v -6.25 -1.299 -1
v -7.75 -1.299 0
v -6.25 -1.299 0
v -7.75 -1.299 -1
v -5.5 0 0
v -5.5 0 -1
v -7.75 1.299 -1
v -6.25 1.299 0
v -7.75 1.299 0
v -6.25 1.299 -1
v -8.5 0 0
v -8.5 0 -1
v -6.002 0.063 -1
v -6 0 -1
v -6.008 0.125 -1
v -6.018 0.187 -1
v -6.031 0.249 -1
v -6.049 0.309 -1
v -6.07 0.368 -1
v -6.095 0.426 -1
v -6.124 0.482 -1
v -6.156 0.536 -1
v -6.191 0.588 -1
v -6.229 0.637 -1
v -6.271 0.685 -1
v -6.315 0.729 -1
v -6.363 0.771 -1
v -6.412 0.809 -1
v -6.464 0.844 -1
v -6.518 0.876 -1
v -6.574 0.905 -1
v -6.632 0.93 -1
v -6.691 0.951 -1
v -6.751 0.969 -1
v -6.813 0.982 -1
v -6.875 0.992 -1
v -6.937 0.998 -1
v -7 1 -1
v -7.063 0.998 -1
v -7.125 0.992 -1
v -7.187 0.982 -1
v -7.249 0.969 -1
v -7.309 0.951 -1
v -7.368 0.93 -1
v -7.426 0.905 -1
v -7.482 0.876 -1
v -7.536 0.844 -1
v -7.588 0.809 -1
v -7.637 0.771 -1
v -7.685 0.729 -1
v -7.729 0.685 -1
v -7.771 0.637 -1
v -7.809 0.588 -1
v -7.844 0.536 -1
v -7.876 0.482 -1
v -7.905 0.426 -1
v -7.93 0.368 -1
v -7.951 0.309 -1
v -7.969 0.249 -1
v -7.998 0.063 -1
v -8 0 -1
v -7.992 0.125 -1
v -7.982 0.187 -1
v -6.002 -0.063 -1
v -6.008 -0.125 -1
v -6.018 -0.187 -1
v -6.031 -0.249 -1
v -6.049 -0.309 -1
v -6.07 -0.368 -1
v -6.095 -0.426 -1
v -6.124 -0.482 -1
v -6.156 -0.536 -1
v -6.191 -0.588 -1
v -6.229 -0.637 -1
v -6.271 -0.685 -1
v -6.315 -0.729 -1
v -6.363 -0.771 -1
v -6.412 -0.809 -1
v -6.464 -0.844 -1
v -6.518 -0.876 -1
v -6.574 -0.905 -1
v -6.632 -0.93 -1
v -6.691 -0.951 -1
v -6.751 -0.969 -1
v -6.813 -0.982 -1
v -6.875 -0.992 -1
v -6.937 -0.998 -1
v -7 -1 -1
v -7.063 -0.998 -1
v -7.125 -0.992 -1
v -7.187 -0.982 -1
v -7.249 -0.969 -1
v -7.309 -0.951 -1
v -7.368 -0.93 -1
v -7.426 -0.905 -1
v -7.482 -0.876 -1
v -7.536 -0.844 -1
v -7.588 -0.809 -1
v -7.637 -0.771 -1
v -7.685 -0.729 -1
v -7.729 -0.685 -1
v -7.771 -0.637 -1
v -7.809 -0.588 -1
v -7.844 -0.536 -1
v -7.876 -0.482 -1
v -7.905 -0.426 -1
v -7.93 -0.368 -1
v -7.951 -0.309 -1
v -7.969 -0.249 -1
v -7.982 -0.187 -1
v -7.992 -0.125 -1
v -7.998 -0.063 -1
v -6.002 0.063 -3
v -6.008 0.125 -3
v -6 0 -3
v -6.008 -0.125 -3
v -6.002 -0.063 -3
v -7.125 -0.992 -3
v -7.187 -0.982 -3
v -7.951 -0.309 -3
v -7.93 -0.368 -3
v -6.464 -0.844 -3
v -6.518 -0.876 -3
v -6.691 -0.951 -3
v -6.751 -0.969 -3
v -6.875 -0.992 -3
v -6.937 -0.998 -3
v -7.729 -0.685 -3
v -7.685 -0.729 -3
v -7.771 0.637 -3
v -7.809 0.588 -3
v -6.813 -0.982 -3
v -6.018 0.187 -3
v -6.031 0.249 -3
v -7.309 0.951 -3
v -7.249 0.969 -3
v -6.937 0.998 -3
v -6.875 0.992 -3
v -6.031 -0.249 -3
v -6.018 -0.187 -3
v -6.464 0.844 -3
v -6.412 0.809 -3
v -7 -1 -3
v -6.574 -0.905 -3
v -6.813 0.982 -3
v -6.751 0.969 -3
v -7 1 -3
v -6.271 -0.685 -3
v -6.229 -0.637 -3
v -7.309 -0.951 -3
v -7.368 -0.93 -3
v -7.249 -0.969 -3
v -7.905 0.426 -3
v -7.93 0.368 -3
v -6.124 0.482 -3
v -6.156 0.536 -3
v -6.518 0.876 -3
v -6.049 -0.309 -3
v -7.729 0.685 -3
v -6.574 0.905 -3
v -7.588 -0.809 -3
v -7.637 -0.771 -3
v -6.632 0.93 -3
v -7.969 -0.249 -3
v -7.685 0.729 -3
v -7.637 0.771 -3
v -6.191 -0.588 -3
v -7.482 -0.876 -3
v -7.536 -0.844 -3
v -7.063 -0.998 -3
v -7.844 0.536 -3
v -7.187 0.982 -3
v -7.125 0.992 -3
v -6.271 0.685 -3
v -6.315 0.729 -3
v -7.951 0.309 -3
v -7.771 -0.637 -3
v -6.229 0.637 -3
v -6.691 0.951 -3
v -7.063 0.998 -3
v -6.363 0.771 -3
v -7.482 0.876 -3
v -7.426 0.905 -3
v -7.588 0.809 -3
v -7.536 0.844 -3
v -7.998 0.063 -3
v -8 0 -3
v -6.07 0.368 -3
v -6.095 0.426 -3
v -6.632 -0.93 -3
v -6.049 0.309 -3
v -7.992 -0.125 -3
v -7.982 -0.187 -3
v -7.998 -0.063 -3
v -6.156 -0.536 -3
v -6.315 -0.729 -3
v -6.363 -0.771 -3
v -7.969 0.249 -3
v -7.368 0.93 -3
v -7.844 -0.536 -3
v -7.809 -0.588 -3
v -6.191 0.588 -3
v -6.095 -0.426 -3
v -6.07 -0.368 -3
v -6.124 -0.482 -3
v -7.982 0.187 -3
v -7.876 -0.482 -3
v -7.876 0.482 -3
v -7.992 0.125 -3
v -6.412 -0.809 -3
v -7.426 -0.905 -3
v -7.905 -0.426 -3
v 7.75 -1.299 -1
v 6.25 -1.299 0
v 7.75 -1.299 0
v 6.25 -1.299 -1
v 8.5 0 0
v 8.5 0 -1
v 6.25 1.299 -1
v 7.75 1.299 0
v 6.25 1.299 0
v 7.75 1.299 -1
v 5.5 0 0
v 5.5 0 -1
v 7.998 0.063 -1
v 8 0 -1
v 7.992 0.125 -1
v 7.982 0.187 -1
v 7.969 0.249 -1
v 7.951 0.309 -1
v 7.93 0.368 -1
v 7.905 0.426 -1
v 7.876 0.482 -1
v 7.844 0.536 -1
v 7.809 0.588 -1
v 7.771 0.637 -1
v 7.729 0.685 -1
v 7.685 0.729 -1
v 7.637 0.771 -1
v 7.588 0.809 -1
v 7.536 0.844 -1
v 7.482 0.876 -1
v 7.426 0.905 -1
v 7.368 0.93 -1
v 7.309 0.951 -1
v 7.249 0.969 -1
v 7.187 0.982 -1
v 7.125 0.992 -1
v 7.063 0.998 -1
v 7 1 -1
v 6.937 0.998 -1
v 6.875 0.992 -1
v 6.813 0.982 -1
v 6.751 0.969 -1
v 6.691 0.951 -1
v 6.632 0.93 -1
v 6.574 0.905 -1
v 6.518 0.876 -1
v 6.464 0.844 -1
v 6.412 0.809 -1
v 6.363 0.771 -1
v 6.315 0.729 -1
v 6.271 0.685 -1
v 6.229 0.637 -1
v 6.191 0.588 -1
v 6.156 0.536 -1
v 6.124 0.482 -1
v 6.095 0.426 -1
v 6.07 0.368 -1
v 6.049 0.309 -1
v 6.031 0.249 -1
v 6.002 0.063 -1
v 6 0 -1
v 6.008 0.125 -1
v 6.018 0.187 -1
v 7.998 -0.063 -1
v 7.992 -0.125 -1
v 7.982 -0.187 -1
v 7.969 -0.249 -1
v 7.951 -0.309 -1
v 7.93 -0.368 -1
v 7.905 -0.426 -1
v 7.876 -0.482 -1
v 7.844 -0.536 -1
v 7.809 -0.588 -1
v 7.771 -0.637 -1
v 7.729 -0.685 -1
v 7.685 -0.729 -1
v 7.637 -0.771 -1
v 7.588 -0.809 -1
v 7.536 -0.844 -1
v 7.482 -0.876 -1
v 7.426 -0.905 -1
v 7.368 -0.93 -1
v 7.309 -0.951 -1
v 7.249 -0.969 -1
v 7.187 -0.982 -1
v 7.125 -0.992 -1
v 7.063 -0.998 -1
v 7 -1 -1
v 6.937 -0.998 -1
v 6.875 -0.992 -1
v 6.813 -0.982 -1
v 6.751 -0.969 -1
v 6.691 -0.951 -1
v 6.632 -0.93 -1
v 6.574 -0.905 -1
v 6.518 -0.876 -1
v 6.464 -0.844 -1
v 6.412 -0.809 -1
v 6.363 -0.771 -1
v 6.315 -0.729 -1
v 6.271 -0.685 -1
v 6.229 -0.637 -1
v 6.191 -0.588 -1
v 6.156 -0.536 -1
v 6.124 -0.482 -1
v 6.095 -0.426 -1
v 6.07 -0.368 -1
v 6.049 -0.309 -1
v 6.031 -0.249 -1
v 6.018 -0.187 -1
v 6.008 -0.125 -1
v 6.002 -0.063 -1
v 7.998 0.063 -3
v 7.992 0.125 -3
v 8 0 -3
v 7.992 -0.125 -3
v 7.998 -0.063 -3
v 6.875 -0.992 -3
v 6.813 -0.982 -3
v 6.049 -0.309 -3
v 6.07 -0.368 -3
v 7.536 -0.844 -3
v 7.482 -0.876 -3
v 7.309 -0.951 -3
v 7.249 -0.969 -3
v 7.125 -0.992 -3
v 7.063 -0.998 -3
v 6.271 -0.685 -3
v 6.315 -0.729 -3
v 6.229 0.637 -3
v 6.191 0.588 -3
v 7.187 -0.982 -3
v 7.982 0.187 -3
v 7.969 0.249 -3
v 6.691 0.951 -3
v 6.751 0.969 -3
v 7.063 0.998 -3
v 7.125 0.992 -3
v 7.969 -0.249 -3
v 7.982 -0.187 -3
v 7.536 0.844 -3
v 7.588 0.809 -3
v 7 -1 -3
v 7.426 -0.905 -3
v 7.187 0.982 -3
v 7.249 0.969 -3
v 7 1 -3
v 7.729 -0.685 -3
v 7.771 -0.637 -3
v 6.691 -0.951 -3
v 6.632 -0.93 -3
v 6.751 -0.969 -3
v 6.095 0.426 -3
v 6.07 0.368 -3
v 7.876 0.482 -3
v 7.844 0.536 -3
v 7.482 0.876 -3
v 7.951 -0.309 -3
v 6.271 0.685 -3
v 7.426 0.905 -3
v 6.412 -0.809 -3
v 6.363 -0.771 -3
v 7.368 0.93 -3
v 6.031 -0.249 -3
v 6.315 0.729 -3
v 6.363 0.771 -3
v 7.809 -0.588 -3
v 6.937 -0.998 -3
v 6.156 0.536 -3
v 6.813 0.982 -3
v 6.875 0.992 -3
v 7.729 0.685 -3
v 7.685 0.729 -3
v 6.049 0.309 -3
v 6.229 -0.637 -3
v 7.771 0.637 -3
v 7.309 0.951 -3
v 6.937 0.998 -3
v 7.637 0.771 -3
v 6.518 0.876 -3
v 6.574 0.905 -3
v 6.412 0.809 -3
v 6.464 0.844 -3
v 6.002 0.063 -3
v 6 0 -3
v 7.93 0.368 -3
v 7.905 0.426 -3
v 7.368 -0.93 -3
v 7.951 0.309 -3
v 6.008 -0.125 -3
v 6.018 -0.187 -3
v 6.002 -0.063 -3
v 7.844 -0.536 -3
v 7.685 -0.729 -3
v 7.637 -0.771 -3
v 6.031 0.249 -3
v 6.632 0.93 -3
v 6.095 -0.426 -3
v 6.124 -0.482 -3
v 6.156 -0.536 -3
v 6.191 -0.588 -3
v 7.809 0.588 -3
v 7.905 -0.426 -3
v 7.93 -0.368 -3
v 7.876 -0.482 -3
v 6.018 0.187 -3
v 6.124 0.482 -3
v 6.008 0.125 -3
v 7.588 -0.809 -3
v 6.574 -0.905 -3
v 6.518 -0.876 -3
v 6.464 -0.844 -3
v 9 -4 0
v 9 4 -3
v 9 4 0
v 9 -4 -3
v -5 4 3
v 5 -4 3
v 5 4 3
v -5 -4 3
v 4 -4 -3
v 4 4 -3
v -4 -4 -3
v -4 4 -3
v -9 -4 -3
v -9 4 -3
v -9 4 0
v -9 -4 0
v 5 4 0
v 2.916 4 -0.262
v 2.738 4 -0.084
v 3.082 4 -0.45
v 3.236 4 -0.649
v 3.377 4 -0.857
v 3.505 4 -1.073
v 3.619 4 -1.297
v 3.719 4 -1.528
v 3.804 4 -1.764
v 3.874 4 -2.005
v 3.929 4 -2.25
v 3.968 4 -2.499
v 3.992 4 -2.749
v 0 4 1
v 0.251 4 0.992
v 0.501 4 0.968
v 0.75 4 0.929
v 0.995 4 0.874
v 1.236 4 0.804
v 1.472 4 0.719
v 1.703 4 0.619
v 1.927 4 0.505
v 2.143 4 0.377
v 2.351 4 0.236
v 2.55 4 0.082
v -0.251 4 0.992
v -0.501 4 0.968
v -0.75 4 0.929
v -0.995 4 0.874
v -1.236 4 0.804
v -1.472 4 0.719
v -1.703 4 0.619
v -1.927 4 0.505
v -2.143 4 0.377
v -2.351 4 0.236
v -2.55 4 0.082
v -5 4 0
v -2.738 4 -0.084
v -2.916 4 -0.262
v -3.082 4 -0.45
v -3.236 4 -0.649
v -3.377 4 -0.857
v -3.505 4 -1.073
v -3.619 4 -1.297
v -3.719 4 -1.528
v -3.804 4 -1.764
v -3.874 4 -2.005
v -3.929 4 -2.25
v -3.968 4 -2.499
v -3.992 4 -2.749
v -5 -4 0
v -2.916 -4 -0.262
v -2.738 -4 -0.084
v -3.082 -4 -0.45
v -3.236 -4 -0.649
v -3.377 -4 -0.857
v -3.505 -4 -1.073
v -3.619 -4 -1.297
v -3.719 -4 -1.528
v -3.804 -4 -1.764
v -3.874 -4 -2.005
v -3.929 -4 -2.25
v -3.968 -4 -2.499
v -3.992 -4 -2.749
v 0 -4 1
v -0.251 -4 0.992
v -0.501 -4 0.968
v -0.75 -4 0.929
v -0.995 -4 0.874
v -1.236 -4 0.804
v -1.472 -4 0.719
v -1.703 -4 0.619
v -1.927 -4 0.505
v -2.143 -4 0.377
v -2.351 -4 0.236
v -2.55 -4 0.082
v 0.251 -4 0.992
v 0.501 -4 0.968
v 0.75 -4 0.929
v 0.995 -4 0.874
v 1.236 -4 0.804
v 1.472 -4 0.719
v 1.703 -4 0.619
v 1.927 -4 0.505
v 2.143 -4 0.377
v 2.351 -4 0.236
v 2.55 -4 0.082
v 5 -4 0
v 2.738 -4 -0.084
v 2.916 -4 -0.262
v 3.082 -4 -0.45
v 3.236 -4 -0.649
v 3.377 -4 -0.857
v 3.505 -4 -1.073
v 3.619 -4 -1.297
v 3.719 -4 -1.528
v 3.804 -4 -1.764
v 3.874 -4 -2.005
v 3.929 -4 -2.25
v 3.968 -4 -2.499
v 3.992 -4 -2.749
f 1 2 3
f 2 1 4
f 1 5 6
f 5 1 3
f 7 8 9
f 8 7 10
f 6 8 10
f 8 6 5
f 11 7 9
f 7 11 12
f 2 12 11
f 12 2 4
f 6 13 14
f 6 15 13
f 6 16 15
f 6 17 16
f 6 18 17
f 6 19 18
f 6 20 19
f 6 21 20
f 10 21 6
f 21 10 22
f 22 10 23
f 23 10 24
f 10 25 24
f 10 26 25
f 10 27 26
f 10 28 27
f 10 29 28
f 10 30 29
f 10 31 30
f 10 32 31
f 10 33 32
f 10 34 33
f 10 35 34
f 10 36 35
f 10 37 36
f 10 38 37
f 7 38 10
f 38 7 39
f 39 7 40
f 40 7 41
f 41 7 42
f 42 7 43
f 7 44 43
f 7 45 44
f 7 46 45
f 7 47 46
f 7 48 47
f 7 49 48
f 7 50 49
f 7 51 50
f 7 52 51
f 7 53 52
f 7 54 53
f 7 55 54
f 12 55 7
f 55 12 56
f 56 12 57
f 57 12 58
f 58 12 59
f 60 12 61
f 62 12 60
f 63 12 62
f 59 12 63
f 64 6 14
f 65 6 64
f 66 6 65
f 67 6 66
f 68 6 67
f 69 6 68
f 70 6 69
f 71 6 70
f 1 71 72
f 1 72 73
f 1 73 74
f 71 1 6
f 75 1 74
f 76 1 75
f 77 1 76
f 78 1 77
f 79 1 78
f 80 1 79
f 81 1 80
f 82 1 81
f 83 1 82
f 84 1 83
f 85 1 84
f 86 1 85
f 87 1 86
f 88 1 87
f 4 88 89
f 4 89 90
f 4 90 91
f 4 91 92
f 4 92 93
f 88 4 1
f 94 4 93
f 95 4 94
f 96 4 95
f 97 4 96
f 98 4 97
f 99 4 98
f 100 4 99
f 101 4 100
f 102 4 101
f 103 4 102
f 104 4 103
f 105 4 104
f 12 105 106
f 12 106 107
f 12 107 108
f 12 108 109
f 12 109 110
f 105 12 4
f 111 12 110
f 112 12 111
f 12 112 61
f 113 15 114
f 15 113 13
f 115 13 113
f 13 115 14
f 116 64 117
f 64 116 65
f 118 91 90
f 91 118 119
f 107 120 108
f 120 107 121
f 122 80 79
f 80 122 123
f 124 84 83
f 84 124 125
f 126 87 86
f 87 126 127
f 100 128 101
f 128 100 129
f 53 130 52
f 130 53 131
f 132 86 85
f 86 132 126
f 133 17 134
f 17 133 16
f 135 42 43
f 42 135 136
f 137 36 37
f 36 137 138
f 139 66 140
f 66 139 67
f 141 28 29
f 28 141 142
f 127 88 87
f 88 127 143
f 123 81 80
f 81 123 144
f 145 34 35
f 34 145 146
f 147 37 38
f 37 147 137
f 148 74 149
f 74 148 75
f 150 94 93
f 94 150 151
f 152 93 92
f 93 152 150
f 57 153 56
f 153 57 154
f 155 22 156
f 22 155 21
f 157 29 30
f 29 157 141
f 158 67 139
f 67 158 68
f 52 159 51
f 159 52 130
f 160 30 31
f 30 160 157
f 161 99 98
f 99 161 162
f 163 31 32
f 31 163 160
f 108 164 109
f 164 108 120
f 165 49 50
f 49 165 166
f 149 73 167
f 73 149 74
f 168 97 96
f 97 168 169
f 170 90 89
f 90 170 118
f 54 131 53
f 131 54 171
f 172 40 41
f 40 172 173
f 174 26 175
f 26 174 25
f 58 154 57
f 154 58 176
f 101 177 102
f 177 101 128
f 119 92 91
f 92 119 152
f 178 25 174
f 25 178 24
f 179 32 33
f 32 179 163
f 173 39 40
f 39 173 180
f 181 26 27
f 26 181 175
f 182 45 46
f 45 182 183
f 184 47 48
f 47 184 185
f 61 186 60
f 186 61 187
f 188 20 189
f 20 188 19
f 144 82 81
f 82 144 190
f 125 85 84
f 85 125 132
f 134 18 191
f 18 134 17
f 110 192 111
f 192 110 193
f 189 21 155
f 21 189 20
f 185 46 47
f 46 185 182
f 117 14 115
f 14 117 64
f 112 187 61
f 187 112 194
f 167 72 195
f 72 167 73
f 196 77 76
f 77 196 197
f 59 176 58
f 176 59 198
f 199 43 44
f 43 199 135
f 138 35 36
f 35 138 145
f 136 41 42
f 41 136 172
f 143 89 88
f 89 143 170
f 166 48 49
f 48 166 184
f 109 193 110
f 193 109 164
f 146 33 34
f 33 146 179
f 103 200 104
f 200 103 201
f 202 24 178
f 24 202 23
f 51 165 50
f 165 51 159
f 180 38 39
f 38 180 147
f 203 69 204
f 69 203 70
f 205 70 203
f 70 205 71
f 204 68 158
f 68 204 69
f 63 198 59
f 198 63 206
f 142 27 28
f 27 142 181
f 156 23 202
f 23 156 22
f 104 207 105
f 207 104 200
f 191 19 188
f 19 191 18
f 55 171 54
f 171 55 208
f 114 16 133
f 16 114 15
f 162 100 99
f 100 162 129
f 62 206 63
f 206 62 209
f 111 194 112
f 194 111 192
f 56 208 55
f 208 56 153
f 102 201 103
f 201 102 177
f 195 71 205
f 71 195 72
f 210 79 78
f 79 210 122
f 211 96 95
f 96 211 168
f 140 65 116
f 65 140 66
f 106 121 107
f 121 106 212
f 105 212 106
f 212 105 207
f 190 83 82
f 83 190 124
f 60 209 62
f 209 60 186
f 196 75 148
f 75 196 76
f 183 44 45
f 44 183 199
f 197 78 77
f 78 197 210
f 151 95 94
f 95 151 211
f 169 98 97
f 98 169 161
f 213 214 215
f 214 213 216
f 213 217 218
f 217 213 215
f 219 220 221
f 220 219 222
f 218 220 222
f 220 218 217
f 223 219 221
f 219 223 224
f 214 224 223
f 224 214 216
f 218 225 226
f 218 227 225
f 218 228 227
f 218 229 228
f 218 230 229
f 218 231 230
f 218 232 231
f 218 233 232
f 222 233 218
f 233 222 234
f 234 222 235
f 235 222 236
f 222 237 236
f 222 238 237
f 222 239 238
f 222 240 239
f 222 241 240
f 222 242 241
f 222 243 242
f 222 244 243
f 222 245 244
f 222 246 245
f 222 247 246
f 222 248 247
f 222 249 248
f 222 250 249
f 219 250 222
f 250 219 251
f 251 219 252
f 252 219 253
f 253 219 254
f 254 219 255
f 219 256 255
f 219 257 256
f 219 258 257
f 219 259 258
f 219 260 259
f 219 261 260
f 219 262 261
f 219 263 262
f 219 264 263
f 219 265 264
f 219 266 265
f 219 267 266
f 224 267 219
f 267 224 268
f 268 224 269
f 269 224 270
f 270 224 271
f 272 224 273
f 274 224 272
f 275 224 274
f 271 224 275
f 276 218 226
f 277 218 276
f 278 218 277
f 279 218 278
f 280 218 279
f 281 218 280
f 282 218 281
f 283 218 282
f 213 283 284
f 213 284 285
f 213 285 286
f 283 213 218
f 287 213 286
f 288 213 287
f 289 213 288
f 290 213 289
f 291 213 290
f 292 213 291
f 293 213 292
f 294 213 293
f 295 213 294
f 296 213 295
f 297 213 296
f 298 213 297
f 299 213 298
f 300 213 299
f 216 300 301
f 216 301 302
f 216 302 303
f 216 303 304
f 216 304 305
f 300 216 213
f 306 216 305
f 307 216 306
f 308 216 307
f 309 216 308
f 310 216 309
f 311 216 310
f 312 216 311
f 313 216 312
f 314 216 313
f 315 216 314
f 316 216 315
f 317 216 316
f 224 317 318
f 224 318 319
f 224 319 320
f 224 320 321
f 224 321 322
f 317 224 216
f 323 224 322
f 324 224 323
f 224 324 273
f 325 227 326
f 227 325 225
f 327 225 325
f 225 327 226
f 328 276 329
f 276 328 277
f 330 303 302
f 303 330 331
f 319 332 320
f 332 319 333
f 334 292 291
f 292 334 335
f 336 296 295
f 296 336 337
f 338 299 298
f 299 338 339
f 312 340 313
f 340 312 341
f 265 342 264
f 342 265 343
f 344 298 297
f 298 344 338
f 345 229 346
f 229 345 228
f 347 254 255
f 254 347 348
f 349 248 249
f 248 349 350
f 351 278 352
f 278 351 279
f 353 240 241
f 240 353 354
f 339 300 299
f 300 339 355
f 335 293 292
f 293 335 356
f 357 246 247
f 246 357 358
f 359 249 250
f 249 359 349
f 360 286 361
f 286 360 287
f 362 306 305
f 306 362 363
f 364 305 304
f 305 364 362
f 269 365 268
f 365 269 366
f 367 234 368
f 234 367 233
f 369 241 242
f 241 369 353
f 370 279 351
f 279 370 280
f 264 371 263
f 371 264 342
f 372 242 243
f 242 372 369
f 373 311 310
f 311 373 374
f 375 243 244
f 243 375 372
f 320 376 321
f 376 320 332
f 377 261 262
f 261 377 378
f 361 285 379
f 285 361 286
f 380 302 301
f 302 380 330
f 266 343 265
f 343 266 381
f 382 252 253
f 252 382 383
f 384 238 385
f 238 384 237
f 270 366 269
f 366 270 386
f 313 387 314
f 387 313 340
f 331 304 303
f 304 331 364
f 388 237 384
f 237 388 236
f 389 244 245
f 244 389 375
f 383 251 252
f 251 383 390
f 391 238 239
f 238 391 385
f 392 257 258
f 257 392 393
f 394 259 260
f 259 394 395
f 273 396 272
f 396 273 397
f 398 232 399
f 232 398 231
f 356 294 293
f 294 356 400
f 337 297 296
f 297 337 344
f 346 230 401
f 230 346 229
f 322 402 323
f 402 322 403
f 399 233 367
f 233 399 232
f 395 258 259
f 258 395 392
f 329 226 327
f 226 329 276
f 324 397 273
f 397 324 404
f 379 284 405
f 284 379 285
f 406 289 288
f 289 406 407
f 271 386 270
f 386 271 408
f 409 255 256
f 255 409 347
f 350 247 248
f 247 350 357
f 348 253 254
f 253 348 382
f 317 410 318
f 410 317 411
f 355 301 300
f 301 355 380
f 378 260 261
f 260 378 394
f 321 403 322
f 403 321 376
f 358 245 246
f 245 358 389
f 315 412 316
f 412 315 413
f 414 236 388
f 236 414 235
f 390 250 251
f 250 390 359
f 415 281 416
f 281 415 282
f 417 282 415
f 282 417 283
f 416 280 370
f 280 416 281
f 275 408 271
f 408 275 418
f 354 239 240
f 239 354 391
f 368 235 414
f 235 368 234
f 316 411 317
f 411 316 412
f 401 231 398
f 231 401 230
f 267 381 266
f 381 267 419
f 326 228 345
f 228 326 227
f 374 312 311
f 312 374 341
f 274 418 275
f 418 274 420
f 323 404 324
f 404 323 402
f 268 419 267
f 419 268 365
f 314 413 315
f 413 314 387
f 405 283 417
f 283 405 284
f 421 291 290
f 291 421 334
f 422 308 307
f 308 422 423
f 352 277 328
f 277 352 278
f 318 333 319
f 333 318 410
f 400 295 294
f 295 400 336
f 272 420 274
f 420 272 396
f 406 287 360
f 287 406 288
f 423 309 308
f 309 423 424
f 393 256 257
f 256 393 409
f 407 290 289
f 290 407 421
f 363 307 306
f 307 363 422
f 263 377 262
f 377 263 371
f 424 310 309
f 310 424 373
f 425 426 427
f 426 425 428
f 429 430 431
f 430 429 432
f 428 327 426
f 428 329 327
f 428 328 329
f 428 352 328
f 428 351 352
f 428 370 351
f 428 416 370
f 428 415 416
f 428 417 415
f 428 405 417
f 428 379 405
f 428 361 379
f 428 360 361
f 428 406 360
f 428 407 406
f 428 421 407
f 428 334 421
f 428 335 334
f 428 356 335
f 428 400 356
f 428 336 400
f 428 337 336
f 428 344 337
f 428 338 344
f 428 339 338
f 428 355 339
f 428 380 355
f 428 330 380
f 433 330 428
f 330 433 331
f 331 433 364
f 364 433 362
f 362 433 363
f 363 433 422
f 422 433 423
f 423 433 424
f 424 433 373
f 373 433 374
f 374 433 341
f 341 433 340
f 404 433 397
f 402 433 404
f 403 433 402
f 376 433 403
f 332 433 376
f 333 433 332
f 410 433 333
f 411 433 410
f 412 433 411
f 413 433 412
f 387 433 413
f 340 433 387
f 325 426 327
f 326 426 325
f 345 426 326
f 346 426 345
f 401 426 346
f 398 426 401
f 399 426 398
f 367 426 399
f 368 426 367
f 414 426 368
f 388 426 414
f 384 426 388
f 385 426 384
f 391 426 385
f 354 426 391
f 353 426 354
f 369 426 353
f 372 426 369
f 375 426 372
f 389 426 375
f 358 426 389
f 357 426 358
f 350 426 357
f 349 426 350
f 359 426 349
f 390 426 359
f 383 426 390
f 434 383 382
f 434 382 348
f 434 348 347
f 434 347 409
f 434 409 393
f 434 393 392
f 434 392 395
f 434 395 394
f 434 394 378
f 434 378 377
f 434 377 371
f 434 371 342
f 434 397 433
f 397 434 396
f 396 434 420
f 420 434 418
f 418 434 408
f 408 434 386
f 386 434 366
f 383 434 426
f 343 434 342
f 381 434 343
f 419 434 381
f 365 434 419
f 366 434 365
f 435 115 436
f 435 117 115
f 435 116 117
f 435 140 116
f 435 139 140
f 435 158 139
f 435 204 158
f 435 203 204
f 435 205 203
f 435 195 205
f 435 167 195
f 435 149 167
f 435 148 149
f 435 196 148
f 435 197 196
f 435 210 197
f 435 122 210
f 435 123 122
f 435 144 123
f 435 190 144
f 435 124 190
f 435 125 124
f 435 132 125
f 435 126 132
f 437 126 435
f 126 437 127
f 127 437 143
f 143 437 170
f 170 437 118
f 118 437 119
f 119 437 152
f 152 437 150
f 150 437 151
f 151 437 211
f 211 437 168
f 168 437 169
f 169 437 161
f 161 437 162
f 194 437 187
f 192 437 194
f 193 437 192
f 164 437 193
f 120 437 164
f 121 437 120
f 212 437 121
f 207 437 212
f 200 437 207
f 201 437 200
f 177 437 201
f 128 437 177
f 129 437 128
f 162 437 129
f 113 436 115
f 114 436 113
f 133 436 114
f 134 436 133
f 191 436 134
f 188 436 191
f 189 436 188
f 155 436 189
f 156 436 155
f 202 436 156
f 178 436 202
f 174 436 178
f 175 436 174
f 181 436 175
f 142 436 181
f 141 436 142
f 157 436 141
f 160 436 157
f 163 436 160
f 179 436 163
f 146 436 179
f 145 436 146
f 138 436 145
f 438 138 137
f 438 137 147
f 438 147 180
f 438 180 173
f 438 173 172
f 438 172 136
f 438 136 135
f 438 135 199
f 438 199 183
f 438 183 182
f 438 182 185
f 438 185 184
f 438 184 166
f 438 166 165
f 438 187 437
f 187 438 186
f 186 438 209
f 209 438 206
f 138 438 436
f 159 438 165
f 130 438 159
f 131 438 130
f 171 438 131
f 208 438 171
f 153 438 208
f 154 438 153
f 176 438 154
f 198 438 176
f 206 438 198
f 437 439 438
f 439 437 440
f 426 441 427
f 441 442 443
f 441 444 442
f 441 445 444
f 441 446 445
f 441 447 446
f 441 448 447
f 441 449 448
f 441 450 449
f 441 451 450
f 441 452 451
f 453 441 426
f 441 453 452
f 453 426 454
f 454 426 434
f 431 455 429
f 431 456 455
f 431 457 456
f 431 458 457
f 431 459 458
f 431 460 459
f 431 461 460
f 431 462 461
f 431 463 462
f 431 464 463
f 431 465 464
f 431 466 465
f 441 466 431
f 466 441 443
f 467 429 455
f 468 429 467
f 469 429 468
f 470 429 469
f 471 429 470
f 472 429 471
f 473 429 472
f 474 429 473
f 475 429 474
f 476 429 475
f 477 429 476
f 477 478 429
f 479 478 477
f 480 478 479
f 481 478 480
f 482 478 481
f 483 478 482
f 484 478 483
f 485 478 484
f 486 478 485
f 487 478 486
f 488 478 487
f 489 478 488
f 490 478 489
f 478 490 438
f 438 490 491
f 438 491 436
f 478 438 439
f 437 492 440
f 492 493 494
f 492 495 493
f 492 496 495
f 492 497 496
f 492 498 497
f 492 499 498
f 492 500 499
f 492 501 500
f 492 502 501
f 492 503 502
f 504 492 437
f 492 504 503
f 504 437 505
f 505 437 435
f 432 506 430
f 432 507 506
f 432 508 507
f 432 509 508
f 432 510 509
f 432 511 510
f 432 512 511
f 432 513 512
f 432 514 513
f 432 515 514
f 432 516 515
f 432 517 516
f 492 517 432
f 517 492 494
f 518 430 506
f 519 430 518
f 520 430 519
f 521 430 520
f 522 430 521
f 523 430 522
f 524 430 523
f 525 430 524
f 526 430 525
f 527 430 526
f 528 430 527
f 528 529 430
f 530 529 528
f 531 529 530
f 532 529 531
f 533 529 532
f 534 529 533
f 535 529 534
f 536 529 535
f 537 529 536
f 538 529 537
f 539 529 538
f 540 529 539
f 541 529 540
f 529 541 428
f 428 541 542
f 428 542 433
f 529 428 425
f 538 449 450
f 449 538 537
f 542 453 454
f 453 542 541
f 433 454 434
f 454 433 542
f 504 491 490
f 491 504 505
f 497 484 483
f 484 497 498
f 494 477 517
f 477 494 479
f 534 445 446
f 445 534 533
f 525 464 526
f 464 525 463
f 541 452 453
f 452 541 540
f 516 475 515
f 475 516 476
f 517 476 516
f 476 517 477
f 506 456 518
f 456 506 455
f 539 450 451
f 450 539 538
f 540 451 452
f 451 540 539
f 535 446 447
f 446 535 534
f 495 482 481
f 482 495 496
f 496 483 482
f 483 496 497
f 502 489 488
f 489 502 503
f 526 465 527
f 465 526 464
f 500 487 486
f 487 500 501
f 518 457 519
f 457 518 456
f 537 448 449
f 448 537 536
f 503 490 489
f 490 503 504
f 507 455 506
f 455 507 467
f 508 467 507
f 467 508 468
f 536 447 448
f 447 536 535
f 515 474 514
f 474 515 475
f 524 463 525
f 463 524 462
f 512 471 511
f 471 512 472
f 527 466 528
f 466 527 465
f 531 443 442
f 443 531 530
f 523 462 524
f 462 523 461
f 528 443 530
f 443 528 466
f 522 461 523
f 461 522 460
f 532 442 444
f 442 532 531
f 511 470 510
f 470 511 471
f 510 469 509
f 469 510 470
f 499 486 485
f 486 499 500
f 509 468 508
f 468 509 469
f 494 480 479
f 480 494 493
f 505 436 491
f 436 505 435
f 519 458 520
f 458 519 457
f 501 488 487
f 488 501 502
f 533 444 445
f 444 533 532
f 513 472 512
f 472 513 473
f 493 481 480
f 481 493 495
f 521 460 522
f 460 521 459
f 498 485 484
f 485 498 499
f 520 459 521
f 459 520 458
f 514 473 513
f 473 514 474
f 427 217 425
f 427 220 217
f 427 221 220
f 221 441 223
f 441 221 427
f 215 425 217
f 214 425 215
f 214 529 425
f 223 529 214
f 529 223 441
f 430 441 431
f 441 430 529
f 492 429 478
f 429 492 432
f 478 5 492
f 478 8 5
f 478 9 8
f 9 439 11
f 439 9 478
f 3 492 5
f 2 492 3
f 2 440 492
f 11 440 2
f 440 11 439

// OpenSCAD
internal_rad = 4;
base_width = 18;

difference() {
	// top bracket
	cube([base_width, 8, 6], center=true);
	// cylinder difference for handlbar
	translate([0,0,-3])
		rotate([90,0,0]) cylinder(h=9, r=internal_rad, center=true, $fn=100);
	// cube difference to remove extra volume
	translate([7,0,2])
		cube([4,8,4], center=true);
	translate([-7,0,2])
		cube([4,8,4], center=true);
	translate([-7,0,0]) {
		cylinder(h=2, r=1.5, center=true, $fn=6);
		cylinder(h=8, r=1, center=true, $fn=100);
	}
	translate([7,0,0]) {
		cylinder(h=2, r=1.5, center=true, $fn=6);
		cylinder(h=8, r=1, center=true, $fn=100);
	}
}
